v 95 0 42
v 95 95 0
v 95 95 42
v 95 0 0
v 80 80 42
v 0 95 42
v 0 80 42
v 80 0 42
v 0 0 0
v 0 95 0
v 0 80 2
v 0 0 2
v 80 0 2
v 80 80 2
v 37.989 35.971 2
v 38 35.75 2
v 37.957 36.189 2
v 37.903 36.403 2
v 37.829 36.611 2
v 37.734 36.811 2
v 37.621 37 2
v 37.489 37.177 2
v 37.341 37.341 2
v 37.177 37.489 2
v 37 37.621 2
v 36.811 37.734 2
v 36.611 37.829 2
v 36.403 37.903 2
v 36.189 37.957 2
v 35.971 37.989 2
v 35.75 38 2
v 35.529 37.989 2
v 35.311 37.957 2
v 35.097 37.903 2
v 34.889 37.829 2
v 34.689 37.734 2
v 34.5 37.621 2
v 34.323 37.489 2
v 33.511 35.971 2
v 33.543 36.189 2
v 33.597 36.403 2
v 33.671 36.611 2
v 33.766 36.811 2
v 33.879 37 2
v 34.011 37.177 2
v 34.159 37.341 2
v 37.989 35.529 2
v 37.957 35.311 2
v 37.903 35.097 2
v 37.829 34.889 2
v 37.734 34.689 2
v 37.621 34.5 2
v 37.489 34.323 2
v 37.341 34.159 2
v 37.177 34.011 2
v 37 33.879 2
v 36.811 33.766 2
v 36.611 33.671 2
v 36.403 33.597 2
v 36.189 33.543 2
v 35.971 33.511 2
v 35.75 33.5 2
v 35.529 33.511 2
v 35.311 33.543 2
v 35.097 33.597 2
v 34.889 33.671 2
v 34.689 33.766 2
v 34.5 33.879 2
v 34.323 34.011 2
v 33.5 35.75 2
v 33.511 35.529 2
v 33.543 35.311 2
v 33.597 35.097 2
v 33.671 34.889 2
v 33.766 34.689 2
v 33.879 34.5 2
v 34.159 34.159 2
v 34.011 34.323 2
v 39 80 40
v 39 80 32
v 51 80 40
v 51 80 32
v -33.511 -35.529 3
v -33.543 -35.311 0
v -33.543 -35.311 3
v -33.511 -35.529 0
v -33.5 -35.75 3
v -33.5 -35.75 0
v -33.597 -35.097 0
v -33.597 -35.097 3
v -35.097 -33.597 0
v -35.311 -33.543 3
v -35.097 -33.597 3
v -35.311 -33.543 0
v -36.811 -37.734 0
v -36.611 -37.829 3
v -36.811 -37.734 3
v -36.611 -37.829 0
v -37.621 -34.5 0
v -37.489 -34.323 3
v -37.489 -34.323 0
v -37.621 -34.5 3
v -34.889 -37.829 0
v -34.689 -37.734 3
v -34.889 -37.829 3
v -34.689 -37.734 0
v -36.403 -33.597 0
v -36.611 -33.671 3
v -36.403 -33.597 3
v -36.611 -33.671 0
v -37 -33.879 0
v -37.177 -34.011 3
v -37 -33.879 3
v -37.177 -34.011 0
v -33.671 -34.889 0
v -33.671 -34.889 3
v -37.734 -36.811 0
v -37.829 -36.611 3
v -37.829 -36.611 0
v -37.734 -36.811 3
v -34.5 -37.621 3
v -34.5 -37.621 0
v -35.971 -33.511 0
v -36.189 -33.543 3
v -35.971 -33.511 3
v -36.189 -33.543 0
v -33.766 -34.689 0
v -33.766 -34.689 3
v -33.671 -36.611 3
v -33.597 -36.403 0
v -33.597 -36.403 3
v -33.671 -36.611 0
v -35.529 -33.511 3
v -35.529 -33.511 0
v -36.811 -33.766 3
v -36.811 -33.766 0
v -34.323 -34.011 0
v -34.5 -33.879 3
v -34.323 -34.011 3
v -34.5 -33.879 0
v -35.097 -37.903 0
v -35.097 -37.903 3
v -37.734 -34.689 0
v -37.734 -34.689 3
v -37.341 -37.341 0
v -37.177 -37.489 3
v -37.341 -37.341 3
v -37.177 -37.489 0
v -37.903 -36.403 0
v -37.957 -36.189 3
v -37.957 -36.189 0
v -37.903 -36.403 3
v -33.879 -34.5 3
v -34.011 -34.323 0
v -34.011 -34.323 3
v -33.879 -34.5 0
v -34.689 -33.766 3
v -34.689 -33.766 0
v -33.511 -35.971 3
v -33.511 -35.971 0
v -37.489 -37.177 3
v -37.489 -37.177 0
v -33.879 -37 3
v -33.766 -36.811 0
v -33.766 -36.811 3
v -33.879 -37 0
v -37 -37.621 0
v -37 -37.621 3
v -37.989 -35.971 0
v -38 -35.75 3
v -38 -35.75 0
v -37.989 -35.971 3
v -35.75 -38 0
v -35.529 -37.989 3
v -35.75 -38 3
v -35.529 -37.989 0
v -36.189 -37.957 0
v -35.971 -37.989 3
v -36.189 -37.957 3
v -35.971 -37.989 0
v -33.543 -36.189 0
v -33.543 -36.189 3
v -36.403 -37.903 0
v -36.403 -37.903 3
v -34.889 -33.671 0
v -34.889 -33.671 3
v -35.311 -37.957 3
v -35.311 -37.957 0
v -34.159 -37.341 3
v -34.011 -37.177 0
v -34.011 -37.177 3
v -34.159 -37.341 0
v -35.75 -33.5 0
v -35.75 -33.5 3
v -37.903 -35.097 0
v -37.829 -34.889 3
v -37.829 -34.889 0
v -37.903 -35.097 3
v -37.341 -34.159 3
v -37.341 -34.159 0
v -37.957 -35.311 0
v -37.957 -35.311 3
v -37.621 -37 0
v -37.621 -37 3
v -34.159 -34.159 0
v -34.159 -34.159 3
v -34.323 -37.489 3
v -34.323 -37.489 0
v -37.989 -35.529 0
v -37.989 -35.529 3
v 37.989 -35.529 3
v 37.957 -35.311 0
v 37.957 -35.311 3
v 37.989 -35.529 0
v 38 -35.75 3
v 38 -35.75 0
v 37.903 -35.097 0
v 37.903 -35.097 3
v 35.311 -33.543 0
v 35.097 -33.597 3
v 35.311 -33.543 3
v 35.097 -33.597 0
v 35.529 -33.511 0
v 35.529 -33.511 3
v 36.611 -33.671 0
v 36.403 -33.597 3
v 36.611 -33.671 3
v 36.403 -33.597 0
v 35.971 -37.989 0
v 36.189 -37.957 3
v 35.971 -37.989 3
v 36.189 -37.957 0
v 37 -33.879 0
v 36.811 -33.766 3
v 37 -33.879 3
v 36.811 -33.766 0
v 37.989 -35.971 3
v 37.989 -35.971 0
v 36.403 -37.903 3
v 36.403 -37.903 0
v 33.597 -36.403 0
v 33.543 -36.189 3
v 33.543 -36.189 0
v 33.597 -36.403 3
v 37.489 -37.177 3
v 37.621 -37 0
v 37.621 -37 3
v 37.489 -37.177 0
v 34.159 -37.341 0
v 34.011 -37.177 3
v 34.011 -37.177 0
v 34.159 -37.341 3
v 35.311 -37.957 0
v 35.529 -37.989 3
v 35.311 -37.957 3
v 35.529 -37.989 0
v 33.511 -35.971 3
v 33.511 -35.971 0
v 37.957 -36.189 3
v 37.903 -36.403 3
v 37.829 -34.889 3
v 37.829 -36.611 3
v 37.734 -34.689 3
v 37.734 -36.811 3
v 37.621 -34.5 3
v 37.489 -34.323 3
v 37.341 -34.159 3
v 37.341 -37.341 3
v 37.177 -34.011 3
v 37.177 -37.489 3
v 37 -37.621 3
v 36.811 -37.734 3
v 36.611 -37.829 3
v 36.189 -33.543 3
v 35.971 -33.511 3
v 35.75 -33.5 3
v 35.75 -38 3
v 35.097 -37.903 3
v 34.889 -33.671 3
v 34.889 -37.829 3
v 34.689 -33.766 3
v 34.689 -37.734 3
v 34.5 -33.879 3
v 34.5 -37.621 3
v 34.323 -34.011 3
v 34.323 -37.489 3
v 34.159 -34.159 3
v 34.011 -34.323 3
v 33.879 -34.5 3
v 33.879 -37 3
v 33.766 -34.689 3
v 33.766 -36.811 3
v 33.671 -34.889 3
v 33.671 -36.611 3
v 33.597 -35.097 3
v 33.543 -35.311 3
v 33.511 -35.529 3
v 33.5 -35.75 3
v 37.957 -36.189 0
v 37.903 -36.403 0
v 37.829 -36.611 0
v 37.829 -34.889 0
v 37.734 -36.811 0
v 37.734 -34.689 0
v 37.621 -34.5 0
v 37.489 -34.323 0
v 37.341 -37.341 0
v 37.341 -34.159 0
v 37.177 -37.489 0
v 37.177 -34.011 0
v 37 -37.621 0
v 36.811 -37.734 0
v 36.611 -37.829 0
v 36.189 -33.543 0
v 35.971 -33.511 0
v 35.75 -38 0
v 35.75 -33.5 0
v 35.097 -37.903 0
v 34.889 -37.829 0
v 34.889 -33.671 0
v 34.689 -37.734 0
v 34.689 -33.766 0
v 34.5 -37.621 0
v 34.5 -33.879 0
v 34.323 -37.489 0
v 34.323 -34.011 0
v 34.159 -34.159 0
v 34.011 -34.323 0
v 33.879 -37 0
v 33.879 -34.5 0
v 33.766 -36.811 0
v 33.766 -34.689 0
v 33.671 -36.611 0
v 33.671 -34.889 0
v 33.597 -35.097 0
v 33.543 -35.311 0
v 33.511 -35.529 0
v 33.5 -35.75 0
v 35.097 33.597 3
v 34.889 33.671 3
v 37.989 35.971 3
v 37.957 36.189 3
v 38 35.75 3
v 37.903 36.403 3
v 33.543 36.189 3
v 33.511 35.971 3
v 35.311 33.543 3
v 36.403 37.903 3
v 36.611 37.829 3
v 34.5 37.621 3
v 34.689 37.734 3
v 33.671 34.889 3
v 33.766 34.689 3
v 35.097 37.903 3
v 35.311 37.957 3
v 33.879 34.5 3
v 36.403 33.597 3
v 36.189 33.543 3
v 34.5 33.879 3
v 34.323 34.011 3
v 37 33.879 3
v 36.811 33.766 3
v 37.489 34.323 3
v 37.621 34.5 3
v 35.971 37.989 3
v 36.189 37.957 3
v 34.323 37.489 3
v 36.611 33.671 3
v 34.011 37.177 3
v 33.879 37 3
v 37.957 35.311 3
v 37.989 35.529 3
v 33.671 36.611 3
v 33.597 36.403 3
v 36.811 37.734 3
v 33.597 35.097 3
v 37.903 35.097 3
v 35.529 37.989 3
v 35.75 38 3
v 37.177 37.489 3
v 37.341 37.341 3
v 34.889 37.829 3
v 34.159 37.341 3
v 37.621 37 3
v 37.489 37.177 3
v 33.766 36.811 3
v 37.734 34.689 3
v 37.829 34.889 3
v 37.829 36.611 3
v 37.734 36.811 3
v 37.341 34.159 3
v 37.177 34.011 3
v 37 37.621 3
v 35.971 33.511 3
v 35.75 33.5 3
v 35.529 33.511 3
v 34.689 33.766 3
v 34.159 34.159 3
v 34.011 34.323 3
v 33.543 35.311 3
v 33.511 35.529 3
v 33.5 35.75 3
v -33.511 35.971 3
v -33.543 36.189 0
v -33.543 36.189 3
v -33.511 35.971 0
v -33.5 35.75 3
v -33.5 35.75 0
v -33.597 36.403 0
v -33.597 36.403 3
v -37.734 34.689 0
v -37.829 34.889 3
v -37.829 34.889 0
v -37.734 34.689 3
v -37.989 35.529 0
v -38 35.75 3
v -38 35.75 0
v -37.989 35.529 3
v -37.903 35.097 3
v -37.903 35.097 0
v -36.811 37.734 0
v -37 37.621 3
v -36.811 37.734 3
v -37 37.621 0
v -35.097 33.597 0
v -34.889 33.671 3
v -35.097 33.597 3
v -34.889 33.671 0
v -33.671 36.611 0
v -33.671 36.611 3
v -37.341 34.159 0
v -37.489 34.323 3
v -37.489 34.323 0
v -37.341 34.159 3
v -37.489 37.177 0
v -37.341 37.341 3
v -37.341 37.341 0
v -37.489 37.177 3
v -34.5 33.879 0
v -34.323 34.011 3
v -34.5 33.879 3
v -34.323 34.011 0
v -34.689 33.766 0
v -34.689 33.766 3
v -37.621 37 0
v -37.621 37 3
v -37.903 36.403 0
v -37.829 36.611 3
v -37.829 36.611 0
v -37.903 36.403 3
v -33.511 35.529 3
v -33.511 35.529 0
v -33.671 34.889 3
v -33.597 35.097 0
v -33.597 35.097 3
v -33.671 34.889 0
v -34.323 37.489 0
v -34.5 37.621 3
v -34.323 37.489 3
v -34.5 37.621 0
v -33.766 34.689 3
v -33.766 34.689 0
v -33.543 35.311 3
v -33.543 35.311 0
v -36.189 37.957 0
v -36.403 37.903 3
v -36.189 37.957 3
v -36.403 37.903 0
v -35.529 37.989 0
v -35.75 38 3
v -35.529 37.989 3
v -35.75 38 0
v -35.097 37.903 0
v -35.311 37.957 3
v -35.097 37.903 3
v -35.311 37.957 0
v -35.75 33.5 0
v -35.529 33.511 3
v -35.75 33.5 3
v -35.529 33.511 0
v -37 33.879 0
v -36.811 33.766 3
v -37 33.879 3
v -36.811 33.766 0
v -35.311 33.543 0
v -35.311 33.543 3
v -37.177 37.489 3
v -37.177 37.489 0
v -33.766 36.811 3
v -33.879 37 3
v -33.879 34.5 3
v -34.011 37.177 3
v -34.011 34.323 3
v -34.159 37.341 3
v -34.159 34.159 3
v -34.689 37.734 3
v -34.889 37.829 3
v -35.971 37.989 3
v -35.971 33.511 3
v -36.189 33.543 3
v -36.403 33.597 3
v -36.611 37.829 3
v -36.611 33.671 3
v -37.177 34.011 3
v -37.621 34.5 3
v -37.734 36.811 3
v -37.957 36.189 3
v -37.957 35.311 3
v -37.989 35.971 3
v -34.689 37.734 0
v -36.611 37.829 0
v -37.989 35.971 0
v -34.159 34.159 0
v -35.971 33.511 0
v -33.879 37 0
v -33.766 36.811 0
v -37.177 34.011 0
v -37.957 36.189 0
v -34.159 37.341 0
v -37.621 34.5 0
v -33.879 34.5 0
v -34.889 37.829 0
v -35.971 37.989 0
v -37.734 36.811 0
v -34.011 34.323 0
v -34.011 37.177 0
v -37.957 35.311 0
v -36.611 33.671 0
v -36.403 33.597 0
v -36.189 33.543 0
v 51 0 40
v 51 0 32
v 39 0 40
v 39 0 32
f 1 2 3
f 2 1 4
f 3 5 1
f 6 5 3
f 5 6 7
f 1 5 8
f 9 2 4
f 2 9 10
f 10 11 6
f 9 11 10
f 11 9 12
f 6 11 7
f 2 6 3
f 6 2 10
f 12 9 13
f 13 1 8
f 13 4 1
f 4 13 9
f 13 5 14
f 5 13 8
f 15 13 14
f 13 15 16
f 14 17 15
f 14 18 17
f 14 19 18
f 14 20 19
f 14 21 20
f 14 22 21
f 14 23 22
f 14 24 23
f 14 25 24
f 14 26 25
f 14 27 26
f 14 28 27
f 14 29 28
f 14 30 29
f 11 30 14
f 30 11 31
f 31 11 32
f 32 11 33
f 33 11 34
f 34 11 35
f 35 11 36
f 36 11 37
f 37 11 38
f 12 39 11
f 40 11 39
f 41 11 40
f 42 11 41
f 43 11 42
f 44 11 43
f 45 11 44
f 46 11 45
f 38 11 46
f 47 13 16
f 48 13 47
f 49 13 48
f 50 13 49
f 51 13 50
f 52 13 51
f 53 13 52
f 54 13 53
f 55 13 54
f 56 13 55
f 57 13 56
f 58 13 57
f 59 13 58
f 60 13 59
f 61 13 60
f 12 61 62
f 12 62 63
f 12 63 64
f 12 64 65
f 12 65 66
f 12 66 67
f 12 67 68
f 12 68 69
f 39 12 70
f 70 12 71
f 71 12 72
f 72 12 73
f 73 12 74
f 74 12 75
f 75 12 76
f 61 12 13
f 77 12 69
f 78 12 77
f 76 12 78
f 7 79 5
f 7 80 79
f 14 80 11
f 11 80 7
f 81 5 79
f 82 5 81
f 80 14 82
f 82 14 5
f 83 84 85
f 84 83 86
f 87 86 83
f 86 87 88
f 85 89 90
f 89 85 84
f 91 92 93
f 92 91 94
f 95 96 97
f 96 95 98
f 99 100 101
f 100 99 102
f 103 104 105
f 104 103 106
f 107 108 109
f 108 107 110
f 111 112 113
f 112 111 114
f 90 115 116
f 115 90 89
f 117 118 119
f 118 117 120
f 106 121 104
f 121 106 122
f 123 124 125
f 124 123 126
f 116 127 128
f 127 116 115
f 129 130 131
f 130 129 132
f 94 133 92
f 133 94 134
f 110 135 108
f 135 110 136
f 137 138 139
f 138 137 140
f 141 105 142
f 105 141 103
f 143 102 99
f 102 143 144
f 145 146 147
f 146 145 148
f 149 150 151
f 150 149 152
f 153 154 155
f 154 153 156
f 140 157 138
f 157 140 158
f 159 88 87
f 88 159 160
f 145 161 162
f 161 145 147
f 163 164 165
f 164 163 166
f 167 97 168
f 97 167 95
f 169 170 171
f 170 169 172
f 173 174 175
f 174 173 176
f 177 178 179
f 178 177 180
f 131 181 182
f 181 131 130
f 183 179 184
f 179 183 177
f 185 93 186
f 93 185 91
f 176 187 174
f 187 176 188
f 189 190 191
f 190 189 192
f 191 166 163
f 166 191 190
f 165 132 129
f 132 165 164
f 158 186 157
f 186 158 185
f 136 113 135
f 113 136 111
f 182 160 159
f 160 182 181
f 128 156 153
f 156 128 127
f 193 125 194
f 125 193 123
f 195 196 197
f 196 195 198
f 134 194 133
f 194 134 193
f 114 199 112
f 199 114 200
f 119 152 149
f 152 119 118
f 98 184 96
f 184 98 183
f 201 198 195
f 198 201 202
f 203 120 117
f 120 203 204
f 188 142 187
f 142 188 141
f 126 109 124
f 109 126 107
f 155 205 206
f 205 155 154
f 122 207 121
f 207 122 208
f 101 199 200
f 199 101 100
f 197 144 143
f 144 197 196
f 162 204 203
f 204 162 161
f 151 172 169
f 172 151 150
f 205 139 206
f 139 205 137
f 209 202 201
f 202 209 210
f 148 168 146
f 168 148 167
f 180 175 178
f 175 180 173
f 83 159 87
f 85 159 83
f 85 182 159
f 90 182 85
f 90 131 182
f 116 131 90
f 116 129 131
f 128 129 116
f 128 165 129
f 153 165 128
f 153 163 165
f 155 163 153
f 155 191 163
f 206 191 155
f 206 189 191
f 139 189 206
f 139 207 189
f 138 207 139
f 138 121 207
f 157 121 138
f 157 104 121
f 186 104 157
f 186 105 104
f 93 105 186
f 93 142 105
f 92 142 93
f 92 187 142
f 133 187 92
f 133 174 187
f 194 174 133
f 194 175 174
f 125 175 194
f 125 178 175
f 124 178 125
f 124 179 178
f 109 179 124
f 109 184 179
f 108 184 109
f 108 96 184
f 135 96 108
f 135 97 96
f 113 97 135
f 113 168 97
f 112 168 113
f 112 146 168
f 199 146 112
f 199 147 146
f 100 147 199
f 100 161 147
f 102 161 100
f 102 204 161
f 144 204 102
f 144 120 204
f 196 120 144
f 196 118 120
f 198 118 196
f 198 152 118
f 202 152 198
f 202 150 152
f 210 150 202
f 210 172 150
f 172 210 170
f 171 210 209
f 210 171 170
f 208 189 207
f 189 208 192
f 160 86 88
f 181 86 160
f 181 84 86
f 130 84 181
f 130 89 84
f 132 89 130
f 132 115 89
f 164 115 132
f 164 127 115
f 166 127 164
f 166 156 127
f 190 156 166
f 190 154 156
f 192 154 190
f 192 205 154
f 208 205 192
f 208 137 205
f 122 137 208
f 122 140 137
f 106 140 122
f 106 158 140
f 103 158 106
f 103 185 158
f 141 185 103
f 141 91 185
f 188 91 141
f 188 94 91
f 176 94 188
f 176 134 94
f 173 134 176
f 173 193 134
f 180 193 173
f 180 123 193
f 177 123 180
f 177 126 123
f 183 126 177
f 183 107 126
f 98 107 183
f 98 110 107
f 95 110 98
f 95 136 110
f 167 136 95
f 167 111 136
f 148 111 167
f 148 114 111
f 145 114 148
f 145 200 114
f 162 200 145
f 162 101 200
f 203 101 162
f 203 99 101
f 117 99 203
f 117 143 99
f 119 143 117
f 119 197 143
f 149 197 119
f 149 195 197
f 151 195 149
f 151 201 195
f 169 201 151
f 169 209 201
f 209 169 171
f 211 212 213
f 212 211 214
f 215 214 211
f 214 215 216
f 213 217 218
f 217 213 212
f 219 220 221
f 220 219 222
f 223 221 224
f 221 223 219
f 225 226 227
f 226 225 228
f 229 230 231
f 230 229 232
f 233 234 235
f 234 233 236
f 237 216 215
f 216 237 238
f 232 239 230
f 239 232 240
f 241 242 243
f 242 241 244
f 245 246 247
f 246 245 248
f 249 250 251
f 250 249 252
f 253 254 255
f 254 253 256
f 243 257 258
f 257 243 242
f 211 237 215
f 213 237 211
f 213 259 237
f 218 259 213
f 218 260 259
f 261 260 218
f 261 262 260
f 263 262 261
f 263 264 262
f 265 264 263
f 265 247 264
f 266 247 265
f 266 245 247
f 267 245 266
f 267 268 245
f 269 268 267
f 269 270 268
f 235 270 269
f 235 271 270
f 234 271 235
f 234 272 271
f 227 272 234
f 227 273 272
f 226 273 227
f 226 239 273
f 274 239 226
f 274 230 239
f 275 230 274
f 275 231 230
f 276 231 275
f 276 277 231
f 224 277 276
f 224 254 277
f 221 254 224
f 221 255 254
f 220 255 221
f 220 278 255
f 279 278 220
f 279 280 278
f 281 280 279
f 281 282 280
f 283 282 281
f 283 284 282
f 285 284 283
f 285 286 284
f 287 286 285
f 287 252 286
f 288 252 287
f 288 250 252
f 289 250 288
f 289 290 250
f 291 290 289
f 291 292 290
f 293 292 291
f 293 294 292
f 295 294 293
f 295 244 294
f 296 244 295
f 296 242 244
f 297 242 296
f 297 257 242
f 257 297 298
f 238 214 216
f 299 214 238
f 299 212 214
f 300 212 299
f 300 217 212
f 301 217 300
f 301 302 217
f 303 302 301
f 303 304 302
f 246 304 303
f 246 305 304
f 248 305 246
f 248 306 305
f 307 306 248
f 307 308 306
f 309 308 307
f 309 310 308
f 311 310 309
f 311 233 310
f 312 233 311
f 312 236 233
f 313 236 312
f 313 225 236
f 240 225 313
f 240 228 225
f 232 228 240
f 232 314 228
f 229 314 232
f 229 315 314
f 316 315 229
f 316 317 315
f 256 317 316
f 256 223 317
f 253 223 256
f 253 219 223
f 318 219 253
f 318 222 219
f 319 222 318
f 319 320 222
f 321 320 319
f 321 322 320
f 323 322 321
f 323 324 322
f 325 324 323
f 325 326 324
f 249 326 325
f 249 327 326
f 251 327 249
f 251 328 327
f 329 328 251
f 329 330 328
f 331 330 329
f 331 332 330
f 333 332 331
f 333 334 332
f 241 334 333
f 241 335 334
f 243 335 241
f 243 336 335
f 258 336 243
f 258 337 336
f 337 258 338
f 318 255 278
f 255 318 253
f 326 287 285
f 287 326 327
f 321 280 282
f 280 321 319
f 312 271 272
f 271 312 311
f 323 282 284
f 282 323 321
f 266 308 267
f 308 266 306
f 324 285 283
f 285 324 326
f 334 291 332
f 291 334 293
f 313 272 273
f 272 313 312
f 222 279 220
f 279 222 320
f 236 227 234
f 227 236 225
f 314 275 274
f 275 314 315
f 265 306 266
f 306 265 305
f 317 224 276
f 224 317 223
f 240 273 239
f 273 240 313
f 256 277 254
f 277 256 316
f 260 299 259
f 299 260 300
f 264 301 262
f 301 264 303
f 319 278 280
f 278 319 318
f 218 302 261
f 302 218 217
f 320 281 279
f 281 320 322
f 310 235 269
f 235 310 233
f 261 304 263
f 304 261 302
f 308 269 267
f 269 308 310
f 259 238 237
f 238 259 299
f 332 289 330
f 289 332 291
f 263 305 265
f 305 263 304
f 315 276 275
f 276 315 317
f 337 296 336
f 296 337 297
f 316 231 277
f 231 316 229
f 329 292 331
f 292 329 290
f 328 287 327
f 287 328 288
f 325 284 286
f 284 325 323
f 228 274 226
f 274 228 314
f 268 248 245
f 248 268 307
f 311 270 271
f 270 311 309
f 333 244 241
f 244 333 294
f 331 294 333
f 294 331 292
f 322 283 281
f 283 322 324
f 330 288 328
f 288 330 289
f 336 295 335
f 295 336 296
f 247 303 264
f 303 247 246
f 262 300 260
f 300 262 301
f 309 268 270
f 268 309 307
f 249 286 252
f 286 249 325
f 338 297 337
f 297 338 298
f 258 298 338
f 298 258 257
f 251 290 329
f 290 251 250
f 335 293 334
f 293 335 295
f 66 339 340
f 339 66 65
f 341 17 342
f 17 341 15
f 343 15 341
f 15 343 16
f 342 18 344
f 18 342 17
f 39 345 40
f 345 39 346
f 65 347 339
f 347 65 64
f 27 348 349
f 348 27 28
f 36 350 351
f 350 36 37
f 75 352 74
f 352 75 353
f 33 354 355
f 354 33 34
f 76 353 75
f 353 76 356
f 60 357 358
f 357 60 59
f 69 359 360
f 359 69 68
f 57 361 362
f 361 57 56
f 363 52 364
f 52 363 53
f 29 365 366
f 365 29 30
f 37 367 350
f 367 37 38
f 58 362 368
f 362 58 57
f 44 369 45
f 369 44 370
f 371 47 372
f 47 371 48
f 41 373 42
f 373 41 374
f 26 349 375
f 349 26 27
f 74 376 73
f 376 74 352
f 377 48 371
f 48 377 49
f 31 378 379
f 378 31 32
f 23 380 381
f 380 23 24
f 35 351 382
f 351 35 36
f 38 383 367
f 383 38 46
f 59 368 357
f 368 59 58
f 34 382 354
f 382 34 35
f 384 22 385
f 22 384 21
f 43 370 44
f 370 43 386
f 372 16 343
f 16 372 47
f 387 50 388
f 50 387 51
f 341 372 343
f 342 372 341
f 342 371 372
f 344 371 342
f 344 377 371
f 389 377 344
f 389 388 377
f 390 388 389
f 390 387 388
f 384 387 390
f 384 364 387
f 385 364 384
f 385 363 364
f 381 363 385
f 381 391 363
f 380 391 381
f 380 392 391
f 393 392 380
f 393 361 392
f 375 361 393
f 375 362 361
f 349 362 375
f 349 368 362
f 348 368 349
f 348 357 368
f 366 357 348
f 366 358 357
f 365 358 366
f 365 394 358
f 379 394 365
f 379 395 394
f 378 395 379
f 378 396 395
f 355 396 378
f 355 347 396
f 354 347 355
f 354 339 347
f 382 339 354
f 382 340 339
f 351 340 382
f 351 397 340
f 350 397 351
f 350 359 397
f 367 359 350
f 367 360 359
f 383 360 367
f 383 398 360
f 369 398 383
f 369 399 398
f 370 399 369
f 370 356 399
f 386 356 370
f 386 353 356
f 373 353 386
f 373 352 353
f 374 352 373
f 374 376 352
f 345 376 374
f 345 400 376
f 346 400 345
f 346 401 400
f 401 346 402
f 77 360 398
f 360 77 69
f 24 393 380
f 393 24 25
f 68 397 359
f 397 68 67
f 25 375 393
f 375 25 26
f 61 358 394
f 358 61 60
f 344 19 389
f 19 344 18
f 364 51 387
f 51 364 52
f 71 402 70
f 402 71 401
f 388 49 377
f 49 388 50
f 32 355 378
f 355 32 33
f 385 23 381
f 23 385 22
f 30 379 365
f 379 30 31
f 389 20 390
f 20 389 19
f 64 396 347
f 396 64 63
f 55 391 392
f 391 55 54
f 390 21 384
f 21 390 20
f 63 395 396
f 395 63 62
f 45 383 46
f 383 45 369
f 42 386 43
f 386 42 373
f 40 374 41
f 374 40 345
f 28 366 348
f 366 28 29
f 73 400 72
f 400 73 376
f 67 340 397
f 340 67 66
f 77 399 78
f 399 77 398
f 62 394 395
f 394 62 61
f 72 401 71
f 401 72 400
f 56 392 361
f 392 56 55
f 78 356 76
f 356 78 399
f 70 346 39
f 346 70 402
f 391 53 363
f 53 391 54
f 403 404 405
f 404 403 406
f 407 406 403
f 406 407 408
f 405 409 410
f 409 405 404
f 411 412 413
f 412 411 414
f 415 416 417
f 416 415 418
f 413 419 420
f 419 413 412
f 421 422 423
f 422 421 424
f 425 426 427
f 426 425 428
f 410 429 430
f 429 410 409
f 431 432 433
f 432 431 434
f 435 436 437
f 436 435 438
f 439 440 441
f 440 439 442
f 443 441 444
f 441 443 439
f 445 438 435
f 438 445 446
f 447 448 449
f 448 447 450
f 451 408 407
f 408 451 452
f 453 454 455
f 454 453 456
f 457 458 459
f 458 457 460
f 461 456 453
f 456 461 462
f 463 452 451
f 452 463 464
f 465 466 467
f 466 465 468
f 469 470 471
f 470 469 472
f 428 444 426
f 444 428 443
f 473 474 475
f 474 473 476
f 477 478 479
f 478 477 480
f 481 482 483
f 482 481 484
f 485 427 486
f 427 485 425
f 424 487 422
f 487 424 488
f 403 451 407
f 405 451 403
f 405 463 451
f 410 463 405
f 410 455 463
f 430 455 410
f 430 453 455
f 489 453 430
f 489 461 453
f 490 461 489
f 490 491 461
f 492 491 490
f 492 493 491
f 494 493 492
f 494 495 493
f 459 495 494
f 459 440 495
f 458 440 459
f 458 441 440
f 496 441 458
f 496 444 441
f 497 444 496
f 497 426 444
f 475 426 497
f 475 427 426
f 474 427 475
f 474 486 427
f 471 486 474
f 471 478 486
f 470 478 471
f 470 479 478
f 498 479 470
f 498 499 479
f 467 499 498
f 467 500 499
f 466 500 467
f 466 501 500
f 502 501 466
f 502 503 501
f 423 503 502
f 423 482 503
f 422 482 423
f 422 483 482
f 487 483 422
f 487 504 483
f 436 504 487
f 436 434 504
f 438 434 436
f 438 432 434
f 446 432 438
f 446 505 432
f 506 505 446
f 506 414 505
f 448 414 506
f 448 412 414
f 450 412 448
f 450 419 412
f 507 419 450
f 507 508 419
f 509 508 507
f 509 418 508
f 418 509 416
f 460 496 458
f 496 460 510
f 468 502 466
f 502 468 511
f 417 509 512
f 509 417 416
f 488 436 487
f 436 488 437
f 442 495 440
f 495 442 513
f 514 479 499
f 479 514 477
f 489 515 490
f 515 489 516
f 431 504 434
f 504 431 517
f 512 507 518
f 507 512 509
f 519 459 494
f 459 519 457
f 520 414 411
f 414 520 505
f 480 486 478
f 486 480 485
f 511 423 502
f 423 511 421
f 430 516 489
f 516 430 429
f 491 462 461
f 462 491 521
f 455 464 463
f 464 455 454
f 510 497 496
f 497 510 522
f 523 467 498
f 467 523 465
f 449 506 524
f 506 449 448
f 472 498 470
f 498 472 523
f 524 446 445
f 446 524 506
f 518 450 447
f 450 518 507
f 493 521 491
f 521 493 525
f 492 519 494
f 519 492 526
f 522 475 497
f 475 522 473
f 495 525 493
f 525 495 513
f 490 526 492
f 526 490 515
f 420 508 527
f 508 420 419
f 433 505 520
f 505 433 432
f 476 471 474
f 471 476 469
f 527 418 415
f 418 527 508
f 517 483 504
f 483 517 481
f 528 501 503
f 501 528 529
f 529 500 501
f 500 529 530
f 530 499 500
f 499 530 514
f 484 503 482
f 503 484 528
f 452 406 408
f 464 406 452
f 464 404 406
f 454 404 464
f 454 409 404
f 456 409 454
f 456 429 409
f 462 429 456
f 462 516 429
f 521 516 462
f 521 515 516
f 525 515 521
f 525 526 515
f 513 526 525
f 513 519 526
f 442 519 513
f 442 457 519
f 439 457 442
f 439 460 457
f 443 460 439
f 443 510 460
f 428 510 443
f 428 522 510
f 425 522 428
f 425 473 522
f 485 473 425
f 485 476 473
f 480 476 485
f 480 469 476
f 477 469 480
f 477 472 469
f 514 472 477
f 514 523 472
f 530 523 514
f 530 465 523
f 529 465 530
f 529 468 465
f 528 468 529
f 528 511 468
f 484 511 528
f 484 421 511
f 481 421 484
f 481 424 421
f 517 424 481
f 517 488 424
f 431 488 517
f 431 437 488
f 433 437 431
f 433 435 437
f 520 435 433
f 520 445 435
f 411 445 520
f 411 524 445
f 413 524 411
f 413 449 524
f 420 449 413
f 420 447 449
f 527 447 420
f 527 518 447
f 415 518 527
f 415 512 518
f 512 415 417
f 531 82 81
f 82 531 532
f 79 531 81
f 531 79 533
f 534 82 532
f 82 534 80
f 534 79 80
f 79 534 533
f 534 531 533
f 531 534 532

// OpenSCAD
// DIY Magnetic Stirrer Housing - corrected geometry.
// Orientation: Top plate on bed (z=0), walls rising to z=40.
// Outer size: 90x90mm. Fan size: 80x80mm.

// Dimensions
outer_size = 90;
fan_size   = 80;
wall_thickness = 2.5;
top_thickness = 2;
wall_height  = 40;

// Hole dimensions
screw_hole_d = 4.5;
screw_hole_pattern = 71.5;

// Notch dimensions
notch_width = 12;
notch_depth = 8; // reaches from z=32 to z=40

$fn = 64;

// Calculate positions
// The part sits on the bed.
// Top plate is 90x90, centred on origin, sitting on z=0.
// Walls rise from the perimeter of the top plate.
// The inner void is 80x80.

module main_body() {
    // Create the solid block: Top plate + Walls
    // Outer dimensions of the solid block (including walls) must be 90mm x 90mm.
    // The walls sit on top of the plate.
    // Plate is 90x90. Walls are 2.5mm thick.
    // So the total width/depth is 90 + 2.5 + 2.5 = 95mm.
    // Height is top_thickness + wall_height = 2 + 40 = 42mm.
    
    outer_w = outer_size + 2 * wall_thickness;
    outer_h = outer_size + 2 * wall_thickness;
    total_h = top_thickness + wall_height;
    
    // Inner void dimensions (the space for the fan)
    // The void starts at z = top_thickness.
    // The void width/depth is fan_size.
    inner_w = fan_size;
    inner_h = fan_size;
    void_z_start = top_thickness;
    void_z_end = total_h;
    
    difference() {
        // 1. The main solid block
        // Centered at origin.
        translate([0, 0, 0]) 
            cube([outer_w, outer_h, total_h]);
        
        // 2. The inner void (open box)
        // This void is a rectangular prism starting at z = top_thickness.
        // It is centered on the origin.
        translate([0, 0, void_z_start]) 
            cube([inner_w, inner_h, void_z_end - void_z_start]);
    }
}

module screw_holes() {
    // Four holes on a 71.5mm square pattern centred on the plate.
    // The plate is 90x90. The pattern is centred.
    // Distance from centre to hole centre is 71.5 / 2 = 35.75.
    
    offset = screw_hole_pattern / 2;
    
    for (i = [0 : 3]) {
        // Determine X and Y offsets based on index
        // 0: -X, -Y
        // 1: +X, -Y
        // 2: +X, +Y
        // 3: -X, +Y
        if (i == 0) {
            translate([-offset, -offset, 0]) 
                cylinder(h = top_thickness + 1, d = screw_hole_d);
        } else if (i == 1) {
            translate([offset, -offset, 0]) 
                cylinder(h = top_thickness + 1, d = screw_hole_d);
        } else if (i == 2) {
            translate([offset, offset, 0]) 
                cylinder(h = top_thickness + 1, d = screw_hole_d);
        } else {
            translate([-offset, offset, 0]) 
                cylinder(h = top_thickness + 1, d = screw_hole_d);
        }
    }
}

module cable_notch() {
    // Notch in one wall.
    // 12mm wide, centred along the wall.
    // Reaches 8mm down from the open edge (z=32 to z=40).
    // Let's place it on the +Y wall (right side when looking from top).
    // The wall is at x = outer_size/2 = 45.
    // The notch goes from x = 45 - notch_width/2 to x = 45 + notch_width/2.
    // It goes from z = 32 to z = 40.
    
    wall_x = outer_size / 2;
    notch_x_start = wall_x - notch_width / 2;
    notch_x_end = wall_x + notch_width / 2;
    
    // Cut the notch
    translate([notch_x_start, 0, 32]) 
        cube([notch_width, outer_size + 2 * wall_thickness, notch_depth]);
}

// Main assembly
difference() {
    union() {
        main_body();
        screw_holes();
        cable_notch();
    }
}
